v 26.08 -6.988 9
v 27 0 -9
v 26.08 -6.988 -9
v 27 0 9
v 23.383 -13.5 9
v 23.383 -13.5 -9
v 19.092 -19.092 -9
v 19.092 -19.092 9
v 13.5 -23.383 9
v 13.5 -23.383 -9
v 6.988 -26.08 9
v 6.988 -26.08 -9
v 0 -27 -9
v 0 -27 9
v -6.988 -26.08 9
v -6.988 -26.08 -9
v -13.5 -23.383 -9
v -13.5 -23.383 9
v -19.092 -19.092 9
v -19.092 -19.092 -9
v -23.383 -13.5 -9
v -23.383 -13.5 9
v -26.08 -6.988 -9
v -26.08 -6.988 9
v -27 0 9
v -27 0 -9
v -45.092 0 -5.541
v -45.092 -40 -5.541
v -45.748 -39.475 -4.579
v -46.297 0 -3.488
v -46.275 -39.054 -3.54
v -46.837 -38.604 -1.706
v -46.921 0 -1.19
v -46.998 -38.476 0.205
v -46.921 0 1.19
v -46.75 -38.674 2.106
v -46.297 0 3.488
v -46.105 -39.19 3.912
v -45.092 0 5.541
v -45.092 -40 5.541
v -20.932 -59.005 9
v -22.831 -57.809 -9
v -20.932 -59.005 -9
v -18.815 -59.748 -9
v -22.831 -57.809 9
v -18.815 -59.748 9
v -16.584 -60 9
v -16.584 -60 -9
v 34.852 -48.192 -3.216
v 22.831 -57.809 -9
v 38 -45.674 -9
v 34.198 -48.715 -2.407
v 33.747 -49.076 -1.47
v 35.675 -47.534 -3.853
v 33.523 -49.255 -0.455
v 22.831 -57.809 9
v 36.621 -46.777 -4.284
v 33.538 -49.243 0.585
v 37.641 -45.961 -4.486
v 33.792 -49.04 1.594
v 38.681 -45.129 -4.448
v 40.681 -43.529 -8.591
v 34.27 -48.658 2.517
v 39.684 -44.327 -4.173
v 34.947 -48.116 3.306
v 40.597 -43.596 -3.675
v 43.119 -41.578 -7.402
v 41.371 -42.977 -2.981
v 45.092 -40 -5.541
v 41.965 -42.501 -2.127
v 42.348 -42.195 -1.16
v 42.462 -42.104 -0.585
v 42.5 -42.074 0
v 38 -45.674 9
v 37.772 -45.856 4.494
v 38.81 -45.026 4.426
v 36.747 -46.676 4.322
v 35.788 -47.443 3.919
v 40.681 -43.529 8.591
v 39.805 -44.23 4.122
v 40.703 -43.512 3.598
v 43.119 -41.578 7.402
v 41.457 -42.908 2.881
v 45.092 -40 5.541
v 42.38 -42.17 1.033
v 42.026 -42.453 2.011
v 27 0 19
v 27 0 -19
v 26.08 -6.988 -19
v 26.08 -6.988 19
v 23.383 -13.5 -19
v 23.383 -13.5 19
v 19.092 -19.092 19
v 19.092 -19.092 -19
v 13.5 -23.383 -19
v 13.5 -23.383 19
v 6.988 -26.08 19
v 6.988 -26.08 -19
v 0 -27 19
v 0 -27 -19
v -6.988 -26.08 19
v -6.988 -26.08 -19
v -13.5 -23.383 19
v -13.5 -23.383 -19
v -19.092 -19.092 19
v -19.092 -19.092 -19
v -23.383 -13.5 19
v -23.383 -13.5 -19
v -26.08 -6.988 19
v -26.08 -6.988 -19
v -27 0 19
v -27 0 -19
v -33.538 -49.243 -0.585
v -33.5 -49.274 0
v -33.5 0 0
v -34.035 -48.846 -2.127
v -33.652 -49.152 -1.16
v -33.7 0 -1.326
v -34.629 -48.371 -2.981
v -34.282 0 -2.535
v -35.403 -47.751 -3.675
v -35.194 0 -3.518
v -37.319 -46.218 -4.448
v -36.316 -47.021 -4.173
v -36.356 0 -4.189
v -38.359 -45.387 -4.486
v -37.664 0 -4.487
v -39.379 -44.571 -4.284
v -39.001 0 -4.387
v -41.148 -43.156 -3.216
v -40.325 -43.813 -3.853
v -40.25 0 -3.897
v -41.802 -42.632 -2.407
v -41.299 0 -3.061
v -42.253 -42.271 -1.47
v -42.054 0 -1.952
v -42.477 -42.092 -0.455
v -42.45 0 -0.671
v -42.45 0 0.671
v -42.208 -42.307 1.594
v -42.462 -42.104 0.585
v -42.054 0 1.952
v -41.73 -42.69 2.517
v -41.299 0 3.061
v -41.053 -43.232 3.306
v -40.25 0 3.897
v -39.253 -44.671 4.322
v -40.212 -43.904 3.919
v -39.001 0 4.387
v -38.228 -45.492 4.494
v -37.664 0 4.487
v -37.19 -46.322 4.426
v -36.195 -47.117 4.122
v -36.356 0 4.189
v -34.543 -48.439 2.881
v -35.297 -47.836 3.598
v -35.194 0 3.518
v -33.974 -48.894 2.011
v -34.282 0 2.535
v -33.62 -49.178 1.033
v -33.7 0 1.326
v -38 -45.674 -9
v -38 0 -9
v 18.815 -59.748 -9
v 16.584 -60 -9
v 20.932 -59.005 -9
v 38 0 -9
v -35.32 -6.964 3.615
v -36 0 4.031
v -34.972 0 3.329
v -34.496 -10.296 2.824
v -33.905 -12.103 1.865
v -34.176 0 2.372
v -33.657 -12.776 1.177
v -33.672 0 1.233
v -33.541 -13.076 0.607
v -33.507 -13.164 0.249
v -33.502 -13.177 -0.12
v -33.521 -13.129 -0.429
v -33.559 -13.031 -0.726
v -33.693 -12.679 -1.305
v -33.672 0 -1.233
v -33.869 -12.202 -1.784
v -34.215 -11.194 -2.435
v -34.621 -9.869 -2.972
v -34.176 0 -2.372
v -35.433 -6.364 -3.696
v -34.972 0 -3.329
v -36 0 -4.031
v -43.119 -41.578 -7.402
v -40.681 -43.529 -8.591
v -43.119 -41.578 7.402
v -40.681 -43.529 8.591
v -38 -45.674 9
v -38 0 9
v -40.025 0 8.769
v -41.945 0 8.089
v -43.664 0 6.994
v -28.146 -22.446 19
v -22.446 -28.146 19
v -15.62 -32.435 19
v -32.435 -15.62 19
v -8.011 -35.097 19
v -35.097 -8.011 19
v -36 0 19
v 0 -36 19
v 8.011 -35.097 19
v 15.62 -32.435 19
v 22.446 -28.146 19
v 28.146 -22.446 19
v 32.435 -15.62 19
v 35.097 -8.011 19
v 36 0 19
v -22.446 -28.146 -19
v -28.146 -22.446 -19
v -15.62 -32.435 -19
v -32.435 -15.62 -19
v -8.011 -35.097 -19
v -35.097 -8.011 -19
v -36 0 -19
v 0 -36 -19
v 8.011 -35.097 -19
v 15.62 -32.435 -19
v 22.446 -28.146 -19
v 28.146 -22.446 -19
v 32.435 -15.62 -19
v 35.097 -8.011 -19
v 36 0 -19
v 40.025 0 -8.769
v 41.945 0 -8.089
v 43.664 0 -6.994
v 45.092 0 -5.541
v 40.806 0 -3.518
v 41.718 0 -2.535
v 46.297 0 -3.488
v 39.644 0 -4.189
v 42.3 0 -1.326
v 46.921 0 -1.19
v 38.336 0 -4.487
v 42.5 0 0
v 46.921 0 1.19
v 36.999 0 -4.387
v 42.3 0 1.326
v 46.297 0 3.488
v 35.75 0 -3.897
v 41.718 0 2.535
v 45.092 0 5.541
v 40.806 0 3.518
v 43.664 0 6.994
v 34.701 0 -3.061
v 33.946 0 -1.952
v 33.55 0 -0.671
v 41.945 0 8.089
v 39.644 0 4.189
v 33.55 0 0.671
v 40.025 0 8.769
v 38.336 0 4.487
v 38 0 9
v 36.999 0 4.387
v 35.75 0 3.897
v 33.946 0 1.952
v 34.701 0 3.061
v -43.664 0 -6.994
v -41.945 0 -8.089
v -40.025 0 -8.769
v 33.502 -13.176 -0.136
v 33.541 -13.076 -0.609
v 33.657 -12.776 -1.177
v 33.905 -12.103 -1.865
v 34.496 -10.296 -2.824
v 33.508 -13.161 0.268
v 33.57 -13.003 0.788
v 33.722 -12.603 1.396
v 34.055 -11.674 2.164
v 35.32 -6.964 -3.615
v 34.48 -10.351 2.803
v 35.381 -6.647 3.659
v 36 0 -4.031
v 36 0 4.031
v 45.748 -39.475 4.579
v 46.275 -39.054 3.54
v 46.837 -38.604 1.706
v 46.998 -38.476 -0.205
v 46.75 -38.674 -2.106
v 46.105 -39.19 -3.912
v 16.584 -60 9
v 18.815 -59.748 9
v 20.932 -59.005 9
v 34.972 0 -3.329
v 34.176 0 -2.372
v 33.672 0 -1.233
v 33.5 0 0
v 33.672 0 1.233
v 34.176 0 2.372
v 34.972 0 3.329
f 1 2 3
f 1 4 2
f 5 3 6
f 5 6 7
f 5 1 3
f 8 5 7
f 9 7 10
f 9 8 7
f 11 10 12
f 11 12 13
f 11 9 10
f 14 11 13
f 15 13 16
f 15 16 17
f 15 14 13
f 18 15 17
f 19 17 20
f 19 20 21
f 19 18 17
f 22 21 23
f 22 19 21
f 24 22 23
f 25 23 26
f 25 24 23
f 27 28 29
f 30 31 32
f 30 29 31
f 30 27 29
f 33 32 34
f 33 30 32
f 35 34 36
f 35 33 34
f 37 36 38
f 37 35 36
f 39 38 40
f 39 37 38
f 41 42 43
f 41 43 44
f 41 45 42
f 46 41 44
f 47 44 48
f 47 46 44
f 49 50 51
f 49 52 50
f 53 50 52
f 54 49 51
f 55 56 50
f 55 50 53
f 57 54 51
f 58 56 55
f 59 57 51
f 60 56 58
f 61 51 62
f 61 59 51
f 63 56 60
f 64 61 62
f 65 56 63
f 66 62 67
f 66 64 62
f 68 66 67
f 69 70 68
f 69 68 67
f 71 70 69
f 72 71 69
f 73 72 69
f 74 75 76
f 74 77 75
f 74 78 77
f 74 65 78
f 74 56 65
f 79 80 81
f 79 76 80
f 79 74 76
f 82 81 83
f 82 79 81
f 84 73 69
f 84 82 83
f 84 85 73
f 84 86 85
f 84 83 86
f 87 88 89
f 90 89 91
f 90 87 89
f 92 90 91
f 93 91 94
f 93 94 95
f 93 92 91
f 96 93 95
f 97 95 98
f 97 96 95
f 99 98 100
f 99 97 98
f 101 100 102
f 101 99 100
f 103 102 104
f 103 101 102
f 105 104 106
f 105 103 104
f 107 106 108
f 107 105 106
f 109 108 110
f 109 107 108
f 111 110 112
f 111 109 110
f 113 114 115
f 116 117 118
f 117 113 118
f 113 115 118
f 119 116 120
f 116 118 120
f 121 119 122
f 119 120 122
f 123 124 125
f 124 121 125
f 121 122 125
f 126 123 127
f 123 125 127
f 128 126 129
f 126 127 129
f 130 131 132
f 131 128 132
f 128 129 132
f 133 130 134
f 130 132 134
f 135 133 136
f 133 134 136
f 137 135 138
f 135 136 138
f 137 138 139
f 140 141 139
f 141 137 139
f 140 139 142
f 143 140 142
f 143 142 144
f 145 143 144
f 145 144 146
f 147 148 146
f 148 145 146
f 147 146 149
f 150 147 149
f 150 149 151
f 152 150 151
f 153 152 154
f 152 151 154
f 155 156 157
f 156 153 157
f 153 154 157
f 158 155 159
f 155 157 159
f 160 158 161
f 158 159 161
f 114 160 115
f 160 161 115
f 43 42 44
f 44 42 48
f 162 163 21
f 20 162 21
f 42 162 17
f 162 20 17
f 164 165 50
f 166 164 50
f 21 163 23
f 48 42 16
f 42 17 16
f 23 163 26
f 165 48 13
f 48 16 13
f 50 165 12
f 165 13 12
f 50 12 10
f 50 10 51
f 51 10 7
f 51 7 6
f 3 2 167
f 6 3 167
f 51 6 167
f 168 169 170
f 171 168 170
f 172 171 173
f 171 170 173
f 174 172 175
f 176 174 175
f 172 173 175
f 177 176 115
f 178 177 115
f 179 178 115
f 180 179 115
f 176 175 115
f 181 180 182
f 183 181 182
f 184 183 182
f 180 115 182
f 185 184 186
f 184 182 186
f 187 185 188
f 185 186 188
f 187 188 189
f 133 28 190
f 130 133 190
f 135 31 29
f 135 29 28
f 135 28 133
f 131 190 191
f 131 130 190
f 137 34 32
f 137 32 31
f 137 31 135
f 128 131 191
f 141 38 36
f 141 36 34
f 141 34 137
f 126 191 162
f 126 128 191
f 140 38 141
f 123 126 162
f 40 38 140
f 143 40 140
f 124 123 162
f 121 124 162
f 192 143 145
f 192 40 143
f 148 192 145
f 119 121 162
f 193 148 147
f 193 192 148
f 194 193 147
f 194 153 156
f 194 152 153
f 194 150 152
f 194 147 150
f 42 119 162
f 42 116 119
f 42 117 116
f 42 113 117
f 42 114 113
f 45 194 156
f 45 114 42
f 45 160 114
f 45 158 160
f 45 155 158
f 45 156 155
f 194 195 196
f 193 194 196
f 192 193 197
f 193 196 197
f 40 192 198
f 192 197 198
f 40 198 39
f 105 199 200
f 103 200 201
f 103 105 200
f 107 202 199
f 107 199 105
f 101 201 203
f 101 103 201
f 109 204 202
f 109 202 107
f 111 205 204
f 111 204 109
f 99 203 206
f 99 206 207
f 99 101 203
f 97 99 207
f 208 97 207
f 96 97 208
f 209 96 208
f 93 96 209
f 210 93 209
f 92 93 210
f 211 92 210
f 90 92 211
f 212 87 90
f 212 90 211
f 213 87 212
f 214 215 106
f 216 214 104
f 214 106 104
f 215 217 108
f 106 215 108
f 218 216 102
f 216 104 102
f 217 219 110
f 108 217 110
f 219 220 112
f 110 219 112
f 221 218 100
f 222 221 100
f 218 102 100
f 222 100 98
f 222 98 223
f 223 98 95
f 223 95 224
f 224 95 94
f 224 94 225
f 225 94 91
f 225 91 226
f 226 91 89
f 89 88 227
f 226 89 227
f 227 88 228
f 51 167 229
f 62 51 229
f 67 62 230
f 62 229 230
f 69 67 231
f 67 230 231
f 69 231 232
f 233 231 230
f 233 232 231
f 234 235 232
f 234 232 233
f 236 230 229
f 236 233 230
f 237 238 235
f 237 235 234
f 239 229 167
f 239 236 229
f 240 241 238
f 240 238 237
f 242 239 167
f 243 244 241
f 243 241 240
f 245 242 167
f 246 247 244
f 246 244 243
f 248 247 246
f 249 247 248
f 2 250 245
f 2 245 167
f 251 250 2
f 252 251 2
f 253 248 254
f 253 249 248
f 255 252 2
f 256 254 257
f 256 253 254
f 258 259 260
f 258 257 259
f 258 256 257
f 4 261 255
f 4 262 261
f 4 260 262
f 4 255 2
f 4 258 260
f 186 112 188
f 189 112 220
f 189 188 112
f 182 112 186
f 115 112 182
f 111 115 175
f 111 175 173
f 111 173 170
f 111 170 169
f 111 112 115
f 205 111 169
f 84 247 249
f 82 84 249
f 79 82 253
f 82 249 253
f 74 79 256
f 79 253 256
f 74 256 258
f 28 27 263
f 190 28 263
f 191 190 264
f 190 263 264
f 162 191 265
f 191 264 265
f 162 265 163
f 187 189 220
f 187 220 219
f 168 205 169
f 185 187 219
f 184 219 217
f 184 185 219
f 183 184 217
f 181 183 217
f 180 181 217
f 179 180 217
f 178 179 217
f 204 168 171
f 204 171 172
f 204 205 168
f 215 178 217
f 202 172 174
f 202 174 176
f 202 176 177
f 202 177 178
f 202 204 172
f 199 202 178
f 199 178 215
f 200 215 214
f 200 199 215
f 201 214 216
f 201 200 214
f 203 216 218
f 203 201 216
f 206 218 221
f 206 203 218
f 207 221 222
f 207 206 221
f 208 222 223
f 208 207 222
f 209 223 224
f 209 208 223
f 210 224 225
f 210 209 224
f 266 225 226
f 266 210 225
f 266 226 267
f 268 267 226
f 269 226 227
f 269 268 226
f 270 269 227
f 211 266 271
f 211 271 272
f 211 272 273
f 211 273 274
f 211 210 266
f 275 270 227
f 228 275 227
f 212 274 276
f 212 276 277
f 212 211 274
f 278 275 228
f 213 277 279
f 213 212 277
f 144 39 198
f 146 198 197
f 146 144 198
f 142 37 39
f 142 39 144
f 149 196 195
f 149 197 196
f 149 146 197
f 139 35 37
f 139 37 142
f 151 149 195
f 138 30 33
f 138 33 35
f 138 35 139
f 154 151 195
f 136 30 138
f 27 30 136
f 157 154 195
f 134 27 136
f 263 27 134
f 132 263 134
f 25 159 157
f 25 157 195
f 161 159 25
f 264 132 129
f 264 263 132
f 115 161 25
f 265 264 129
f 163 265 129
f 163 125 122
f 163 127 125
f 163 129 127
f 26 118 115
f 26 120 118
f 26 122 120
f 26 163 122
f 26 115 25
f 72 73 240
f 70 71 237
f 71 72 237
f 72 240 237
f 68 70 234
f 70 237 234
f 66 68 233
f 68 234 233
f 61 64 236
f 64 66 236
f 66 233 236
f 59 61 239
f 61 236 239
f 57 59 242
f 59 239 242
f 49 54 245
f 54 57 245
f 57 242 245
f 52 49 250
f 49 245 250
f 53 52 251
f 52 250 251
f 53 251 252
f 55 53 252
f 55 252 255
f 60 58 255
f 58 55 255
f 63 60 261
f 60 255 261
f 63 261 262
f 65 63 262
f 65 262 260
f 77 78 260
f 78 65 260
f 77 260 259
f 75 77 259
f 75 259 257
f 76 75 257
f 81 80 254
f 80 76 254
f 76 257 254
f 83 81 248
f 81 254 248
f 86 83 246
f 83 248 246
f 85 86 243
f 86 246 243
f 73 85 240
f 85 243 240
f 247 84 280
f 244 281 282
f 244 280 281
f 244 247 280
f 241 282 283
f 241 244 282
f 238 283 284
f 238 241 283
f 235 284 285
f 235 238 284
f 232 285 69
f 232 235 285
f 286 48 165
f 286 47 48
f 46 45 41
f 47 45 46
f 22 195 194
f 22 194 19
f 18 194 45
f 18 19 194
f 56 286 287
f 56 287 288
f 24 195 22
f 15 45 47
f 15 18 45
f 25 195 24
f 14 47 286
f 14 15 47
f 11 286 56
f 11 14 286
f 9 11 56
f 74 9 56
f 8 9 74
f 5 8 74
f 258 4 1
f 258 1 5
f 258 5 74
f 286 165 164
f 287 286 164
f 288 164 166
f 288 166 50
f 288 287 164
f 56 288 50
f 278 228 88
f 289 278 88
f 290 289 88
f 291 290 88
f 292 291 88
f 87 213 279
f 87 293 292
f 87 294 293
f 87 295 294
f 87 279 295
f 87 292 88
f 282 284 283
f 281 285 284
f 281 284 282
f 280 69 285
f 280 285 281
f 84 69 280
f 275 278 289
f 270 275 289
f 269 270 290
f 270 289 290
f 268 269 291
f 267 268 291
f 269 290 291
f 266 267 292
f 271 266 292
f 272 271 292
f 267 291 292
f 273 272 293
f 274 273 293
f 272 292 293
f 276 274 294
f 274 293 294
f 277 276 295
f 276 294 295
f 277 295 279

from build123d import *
from build123d.topology import SkipClean

# Parameters (mm, degrees)
BOSS_EXTRUDE1_DEPTH = 9
BOSS_EXTRUDE2_DEPTH = 19
SKETCH3_R           = 4.5
CUT_EXTRUDE1_DEPTH  = 60
CUT_EXTRUDE2_DEPTH  = 60
BOSS_EXTRUDE4_DEPTH = 60
CUT_EXTRUDE3_DEPTH  = 30
FILLET1_R           = 10


with BuildPart() as part:
    # Sketch1 → Boss-Extrude1 (new, symmetric)
    with BuildSketch(Plane.XY):
        with BuildLine():
            Line((-45.092177379, 0), (-45.092177379, -40))
            Line((-45.092177379, -40), (-20.092177379, -60))
            Line((-20.092177379, -60), (20.092177379, -60))
            Line((20.092177379, -60), (45.092177379, -40))
            Line((45.092177379, -40), (45.092177379, 0))
            Line((45.092177379, 0), (27, 0))
            ThreePointArc((27, 0), (0, -27), (-27, 0))
            Line((-27, 0), (-45.092177379, 0))
        make_face()
    extrude(amount=BOSS_EXTRUDE1_DEPTH, both=True)


with BuildPart() as body_2:
    # Sketch1<4> → Boss-Extrude2 (new, symmetric)
    with BuildSketch(Plane.XY):
        with BuildLine():
            Line((-27, 0), (-36, 0))
            ThreePointArc((-36, 0), (0, -36), (36, 0))
            Line((36, 0), (27, 0))
            ThreePointArc((27, 0), (0, -27), (-27, 0))
        make_face()
    extrude(amount=BOSS_EXTRUDE2_DEPTH, both=True)


with BuildPart() as cut_extrude1_tool:
    # Sketch3 → Cut-Extrude1 (new body)
    with BuildSketch(Plane(origin=(0, 0, 0), x_dir=(1, 0, 0), z_dir=(0, 1, 0))):
        with Locations((-38, 0)):
            Circle(SKETCH3_R)
        with Locations((38, 0)):
            Circle(SKETCH3_R)
    extrude(amount=-CUT_EXTRUDE1_DEPTH)


with BuildPart() as part_1:
    add(part.part)

    # Cut-Extrude1: cut by cut_extrude1_tool
    add(cut_extrude1_tool.part, mode=Mode.SUBTRACT)

    # Sketch3<4> → Cut-Extrude2 (cut)
    with BuildSketch(Plane(origin=(0, 0, 0), x_dir=(1, 0, 0), z_dir=(0, 1, 0))):
        with BuildLine():
            ThreePointArc((-45.092177379, 5.540850117), (-41.945399152, 8.089117722), (-38, 9))
            Line((-38, 9), (-45.092177379, 9))
            Line((-45.092177379, 9), (-45.092177379, 5.540850117))
        make_face()
        with BuildLine():
            ThreePointArc((-38, -9), (-41.945399152, -8.089117722), (-45.092177379, -5.540850117))
            Line((-45.092177379, -5.540850117), (-45.092177379, -9))
            Line((-45.092177379, -9), (-38, -9))
        make_face()
        with BuildLine():
            Line((45.092177379, 9), (38, 9))
            ThreePointArc((38, 9), (41.945399152, 8.089117722), (45.092177379, 5.540850117))
            Line((45.092177379, 5.540850117), (45.092177379, 9))
        make_face()
        with BuildLine():
            ThreePointArc((45.092177379, -5.540850117), (41.945399152, -8.089117722), (38, -9))
            Line((38, -9), (45.092177379, -9))
            Line((45.092177379, -9), (45.092177379, -5.540850117))
        make_face()
    extrude(amount=-CUT_EXTRUDE2_DEPTH, mode=Mode.SUBTRACT)

    # Sketch3<6> → Boss-Extrude4 (add)
    with SkipClean():  # the faces are left unmerged after this step: merging them gives an invalid solid
        with BuildSketch(Plane(origin=(0, 0, 0), x_dir=(1, 0, 0), z_dir=(0, 1, 0))):
            with BuildLine():
                Line((-45.092177379, -5.540850117), (-45.092177379, 5.540850117))
                ThreePointArc((-45.092177379, 5.540850117), (-47, 0), (-45.092177379, -5.540850117))
            make_face()
            with BuildLine():
                ThreePointArc((45.092177379, -5.540850117), (47, 0), (45.092177379, 5.540850117))
                Line((45.092177379, 5.540850117), (45.092177379, -5.540850117))
            make_face()
        extrude(amount=-BOSS_EXTRUDE4_DEPTH)

    # Sketch6 → Cut-Extrude3 (cut, symmetric)
    with SkipClean():  # the faces are left unmerged after this step: merging them gives an invalid solid
        with BuildSketch(Plane.XY):
            Polygon((-20.092177379, -60), (-62.463966669, -26.102568568), (-62.463966669, -60), align=None)
            Polygon((20.092177379, -60), (65.92187812, -23.336239407), (69.819094965, -60), align=None)
        extrude(amount=CUT_EXTRUDE3_DEPTH, both=True, mode=Mode.SUBTRACT)

    # Fillet1
    fillet1_edges = [part_1.edges().sort_by_distance(p)[0] for p in [
        (20.092177379, -60, 0),
        (-20.092177379, -60, 0),
    ]]
    fillet(fillet1_edges, radius=FILLET1_R)


with BuildPart() as body_2_1:
    add(body_2.part)

    # Cut-Extrude1: cut by cut_extrude1_tool
    add(cut_extrude1_tool.part, mode=Mode.SUBTRACT)


solid = Compound([part_1.part, body_2_1.part])
